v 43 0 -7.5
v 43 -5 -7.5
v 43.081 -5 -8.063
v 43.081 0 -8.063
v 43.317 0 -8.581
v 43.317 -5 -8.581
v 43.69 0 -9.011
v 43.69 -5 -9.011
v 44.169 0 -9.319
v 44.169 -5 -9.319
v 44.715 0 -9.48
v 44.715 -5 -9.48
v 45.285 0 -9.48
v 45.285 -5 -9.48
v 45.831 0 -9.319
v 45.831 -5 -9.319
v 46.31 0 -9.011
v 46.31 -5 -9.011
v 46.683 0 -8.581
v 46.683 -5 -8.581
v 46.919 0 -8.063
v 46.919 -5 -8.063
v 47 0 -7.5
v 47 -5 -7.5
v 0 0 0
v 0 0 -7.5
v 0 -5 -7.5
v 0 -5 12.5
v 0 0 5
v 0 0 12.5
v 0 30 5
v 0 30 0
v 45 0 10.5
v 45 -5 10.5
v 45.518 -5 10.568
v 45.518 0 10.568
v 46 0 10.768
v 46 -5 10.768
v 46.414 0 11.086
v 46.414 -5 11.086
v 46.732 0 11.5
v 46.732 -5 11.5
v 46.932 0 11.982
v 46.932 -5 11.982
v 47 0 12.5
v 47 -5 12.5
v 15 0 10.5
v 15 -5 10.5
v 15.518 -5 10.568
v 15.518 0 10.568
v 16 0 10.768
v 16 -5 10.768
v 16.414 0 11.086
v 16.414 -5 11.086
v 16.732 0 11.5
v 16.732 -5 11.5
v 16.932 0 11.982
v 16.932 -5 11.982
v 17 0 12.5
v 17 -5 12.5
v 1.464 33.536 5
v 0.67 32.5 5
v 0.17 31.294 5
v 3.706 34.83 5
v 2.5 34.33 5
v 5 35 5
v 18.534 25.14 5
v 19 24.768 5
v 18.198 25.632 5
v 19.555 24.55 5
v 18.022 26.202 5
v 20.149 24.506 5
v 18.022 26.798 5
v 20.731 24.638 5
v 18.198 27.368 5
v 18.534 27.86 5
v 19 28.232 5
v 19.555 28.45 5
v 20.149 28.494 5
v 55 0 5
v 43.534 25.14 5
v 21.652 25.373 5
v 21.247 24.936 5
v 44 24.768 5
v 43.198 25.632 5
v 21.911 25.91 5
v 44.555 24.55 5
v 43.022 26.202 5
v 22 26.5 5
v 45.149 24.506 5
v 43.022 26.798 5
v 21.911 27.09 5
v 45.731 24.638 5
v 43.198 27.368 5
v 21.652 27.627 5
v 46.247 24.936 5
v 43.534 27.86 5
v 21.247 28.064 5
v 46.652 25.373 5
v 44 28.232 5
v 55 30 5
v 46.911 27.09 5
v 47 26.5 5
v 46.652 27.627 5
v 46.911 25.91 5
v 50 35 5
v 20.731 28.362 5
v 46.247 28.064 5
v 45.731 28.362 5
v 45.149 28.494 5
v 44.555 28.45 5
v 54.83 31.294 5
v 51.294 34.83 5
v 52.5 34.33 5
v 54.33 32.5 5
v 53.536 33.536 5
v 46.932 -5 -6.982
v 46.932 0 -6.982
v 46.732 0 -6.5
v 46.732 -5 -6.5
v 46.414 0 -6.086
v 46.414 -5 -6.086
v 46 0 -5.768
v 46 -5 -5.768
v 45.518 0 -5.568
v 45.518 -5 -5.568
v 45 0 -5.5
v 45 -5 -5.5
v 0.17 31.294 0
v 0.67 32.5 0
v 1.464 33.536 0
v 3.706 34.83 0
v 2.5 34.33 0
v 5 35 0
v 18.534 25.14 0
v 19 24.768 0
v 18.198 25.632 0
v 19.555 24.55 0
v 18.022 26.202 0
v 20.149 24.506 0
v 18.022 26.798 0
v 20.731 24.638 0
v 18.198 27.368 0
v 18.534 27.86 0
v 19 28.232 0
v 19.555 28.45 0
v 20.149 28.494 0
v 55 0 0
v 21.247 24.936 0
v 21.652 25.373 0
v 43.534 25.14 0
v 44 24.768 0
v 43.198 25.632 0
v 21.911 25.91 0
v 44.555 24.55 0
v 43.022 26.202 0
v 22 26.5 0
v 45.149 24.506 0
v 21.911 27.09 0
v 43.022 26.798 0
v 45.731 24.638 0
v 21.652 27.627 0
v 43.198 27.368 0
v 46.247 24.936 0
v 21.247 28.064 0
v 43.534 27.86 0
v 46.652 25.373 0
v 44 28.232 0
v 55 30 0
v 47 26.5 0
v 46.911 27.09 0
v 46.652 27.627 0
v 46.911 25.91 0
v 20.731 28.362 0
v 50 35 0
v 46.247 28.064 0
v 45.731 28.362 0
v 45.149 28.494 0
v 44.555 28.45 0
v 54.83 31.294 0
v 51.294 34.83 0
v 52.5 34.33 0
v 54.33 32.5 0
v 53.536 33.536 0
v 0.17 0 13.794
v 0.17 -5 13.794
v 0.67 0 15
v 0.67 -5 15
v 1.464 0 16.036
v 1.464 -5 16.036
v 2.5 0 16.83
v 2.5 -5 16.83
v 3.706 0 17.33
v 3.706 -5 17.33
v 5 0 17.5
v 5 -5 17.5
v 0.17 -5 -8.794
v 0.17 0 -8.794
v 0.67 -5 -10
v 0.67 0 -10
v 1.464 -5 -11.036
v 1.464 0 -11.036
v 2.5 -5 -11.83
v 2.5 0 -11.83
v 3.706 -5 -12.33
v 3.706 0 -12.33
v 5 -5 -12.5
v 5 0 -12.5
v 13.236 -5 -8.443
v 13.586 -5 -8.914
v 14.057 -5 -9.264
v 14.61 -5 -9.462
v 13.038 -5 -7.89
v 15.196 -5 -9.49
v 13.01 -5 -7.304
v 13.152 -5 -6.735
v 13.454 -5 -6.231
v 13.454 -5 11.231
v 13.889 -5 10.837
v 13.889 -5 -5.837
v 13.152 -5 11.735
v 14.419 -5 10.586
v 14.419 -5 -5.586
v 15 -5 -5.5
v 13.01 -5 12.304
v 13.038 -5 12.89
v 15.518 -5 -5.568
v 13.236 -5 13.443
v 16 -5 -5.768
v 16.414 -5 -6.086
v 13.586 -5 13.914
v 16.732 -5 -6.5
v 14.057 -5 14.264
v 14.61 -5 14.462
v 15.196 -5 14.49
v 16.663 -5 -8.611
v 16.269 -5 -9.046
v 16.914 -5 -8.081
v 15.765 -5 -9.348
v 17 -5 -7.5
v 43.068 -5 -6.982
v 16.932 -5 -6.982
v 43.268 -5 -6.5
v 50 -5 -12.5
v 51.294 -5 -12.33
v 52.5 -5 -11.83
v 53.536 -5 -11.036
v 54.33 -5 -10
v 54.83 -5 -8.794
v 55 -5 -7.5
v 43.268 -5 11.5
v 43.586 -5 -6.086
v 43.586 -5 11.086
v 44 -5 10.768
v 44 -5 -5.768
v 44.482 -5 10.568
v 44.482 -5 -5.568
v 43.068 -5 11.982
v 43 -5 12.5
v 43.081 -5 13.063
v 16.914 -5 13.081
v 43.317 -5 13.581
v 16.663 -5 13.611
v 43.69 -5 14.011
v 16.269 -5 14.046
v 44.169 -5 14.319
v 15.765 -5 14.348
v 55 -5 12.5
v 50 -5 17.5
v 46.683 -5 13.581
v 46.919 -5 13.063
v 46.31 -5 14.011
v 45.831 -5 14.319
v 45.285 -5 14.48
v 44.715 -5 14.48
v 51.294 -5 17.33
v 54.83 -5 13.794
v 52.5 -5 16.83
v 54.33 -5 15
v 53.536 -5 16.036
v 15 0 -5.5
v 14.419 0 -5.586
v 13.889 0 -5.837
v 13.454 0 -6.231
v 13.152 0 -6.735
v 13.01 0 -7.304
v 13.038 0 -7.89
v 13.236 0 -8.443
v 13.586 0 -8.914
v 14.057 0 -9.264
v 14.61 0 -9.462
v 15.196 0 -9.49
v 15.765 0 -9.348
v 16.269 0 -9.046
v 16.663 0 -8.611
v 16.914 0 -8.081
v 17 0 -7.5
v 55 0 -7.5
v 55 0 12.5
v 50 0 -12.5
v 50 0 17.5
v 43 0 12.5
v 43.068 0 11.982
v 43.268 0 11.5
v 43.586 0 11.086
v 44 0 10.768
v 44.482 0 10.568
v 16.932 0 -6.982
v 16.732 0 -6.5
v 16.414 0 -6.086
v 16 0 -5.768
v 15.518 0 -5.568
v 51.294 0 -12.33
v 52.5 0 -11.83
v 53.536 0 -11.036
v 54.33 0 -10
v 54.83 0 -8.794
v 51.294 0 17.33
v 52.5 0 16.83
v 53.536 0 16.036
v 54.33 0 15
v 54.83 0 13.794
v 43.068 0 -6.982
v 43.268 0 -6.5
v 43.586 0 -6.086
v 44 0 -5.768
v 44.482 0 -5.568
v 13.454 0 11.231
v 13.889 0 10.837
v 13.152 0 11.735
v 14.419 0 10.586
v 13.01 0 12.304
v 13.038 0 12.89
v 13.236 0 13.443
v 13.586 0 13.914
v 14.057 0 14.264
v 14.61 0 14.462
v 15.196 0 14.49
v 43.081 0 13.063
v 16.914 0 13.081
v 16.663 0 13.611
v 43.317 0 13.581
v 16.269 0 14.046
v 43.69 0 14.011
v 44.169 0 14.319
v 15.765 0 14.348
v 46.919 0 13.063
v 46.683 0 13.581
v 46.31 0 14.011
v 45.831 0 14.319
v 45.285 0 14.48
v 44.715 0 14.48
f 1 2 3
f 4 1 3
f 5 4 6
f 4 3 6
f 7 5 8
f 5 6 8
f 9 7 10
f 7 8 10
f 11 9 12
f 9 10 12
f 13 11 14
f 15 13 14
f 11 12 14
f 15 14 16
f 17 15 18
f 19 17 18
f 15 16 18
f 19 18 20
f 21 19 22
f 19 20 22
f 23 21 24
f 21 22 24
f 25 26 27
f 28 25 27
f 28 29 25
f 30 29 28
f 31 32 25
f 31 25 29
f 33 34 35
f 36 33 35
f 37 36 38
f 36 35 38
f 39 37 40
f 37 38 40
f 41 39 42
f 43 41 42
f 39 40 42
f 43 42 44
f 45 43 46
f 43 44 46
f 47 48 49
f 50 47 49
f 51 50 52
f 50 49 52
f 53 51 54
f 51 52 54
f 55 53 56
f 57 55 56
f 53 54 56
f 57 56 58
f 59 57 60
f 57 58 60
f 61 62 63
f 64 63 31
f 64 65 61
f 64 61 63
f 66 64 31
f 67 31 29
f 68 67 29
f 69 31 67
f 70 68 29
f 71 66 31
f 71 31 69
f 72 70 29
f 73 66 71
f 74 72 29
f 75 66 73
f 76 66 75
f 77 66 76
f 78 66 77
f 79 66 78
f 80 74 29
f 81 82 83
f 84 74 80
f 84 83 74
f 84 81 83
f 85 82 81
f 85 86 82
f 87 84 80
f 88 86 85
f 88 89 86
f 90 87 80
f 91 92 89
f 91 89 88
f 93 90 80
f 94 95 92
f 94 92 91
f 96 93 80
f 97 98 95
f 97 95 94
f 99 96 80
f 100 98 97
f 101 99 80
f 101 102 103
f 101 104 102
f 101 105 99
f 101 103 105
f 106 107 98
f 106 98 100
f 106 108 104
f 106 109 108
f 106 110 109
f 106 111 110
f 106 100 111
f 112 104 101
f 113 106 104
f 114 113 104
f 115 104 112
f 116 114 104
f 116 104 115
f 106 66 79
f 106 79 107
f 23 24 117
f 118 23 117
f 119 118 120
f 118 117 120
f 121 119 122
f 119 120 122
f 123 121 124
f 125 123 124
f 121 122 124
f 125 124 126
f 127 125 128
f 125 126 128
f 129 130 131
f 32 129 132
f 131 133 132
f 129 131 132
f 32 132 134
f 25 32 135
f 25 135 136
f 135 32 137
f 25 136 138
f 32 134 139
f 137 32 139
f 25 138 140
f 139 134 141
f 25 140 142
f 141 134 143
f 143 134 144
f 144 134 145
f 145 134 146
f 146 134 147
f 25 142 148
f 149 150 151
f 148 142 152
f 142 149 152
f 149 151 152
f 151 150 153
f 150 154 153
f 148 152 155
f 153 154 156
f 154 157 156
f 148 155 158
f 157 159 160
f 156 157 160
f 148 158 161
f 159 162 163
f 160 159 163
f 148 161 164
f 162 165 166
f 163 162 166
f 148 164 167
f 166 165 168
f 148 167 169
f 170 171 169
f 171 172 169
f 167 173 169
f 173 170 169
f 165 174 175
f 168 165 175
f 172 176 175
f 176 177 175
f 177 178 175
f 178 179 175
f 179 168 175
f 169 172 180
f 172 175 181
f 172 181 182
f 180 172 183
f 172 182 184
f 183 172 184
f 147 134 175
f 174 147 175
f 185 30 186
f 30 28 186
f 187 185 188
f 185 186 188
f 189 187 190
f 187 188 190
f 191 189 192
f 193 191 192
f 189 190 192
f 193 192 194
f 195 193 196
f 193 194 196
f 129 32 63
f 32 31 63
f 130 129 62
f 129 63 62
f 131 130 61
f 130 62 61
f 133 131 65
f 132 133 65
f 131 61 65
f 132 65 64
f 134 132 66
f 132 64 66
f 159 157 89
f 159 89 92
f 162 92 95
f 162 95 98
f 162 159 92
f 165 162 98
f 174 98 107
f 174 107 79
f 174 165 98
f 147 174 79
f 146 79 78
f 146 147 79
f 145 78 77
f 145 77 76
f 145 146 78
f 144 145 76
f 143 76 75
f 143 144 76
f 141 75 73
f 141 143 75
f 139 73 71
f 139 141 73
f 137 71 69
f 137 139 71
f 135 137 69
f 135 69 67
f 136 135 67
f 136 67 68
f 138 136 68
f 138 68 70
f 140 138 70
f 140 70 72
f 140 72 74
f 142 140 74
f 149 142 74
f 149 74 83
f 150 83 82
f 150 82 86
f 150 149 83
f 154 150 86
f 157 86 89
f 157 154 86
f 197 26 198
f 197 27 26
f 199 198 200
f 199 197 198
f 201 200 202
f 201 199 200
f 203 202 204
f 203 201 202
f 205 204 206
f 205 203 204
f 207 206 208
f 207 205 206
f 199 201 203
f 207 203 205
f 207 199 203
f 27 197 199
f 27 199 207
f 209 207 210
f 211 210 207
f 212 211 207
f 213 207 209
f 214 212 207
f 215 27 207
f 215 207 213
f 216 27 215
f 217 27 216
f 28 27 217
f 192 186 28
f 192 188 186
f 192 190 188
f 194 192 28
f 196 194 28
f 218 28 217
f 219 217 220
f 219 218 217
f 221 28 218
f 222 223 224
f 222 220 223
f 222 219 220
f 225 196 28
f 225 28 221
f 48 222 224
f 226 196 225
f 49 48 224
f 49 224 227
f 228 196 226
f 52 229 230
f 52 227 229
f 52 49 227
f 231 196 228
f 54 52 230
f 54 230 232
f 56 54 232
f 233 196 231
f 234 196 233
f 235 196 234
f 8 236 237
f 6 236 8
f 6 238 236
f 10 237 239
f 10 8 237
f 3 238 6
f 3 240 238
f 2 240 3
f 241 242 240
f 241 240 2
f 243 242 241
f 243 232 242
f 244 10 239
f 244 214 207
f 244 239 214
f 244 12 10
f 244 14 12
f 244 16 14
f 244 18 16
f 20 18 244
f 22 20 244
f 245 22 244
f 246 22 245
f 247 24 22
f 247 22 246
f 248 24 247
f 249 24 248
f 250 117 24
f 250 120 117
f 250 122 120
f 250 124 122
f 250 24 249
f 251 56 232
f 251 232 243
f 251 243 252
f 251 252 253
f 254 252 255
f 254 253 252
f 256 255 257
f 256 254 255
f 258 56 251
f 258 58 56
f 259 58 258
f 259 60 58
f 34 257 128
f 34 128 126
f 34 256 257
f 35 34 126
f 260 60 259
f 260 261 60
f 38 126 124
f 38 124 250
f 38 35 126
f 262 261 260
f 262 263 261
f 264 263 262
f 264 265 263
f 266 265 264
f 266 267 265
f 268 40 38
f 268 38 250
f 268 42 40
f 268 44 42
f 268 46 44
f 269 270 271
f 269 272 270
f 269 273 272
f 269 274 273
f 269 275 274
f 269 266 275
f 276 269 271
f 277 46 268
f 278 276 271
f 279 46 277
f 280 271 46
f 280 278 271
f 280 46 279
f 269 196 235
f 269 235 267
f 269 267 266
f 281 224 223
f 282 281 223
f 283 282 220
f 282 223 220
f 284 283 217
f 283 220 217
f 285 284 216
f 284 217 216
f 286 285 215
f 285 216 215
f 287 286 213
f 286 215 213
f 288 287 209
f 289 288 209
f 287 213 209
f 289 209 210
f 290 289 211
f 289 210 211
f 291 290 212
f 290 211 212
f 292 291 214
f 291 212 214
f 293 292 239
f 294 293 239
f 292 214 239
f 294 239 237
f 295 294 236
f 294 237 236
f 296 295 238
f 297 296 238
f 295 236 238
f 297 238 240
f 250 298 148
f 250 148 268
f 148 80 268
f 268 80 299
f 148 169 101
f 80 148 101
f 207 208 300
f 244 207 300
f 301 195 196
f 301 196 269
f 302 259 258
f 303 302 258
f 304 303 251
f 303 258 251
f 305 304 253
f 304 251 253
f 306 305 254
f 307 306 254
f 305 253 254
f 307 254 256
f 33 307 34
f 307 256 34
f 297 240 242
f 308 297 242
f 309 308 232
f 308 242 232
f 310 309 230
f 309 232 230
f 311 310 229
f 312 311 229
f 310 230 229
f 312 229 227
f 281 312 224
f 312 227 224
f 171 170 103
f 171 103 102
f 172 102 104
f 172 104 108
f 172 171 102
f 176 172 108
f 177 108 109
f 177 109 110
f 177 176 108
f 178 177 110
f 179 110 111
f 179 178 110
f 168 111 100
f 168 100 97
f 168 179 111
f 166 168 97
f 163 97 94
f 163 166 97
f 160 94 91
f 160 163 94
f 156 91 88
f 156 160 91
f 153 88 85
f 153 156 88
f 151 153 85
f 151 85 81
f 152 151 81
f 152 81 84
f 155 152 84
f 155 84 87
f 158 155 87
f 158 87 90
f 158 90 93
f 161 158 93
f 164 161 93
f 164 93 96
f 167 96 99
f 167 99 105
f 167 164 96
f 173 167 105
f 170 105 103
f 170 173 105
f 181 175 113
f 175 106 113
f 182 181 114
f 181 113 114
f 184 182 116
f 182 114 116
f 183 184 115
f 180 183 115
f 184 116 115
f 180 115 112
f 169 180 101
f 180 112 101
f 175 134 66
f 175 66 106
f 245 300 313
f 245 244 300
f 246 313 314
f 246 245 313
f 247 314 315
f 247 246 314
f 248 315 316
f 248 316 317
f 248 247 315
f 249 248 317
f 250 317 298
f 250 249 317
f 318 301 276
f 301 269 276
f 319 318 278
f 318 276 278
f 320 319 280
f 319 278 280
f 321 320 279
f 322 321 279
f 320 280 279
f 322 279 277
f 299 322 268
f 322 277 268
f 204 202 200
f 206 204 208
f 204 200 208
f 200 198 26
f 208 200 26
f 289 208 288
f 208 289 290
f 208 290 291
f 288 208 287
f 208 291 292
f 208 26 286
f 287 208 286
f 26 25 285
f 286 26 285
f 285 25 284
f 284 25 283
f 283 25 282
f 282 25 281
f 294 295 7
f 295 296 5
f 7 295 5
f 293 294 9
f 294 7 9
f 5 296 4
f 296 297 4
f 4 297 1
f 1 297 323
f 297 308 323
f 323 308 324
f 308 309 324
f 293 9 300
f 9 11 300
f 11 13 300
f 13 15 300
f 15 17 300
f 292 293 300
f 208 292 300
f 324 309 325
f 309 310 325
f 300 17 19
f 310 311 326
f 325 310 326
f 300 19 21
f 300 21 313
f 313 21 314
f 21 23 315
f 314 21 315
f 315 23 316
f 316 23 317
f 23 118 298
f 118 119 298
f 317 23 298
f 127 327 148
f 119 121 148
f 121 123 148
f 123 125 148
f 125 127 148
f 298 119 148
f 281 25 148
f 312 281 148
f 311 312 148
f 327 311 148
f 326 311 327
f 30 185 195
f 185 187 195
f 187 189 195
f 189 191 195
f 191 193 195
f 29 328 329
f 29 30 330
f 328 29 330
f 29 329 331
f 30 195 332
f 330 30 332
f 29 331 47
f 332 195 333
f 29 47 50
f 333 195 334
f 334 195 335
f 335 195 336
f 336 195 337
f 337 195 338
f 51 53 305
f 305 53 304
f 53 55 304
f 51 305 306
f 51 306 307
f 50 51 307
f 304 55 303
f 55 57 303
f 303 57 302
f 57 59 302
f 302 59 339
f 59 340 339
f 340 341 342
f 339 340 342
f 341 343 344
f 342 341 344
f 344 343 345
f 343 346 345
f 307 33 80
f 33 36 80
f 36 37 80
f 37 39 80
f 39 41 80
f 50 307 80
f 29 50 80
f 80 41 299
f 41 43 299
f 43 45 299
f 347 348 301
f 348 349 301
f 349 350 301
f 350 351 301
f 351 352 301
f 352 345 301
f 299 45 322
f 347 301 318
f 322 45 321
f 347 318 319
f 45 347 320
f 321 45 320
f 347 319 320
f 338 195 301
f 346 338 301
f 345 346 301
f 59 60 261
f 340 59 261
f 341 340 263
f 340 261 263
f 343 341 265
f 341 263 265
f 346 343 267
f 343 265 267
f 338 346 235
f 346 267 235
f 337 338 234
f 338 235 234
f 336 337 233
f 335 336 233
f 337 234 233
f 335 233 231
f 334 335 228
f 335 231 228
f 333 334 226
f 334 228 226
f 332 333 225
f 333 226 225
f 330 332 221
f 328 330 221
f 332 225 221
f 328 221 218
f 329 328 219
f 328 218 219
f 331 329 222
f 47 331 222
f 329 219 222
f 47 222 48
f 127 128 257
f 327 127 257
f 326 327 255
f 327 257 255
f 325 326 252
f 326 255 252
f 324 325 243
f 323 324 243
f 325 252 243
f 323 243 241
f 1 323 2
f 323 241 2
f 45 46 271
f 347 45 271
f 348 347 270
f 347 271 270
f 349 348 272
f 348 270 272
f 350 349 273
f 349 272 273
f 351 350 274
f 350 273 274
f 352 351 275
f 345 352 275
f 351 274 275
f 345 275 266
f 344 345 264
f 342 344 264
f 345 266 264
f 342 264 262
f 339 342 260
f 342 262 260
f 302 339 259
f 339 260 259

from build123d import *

# Parameters (mm, degrees)
SKETCH1_W           = 55
SKETCH1_H           = 35
SKETCH1_R           = 2
BOSS_EXTRUDE1_DEPTH = 5
SKETCH2_W           = 55
SKETCH2_H           = 30
BOSS_EXTRUDE2_DEPTH = 5
CUT_EXTRUDE1_DEPTH  = 5
FILLET1_R           = 5


with BuildPart() as part:
    # Sketch1 → Boss-Extrude1 (new body)
    with BuildSketch(Plane.XY):
        with Locations((27.5, 17.5)):
            Rectangle(SKETCH1_W, SKETCH1_H)
        with Locations((20, 26.5)):
            Circle(SKETCH1_R, mode=Mode.SUBTRACT)
        with Locations((45, 26.5)):
            Circle(SKETCH1_R, mode=Mode.SUBTRACT)
    extrude(amount=BOSS_EXTRUDE1_DEPTH)

    # Sketch2 → Boss-Extrude2 (add)
    with BuildSketch(Plane.XZ):
        with Locations((27.5, 2.5)):
            Rectangle(SKETCH2_W, SKETCH2_H)
    extrude(amount=BOSS_EXTRUDE2_DEPTH)

    # Sketch5 → Cut-Extrude1 (cut)
    with BuildSketch(Plane.XZ.offset(5)):
        with BuildLine():
            ThreePointArc((17, 12.5), (13.585786438, 13.914213562), (15, 10.5))
            Line((15, 10.5), (15, 12.5))
            Line((15, 12.5), (17, 12.5))
        make_face()
        with BuildLine():
            Line((15, 12.5), (15, 10.5))
            ThreePointArc((15, 10.5), (16.414213562, 11.085786438), (17, 12.5))
            Line((17, 12.5), (15, 12.5))
        make_face()
        with BuildLine():
            ThreePointArc((43, 12.5), (43.585786438, 11.085786438), (45, 10.5))
            Line((45, 10.5), (45, 12.5))
            Line((45, 12.5), (43, 12.5))
        make_face()
        with BuildLine():
            Line((45, 12.5), (45, 10.5))
            ThreePointArc((45, 10.5), (46.414213562, 11.085786438), (47, 12.5))
            ThreePointArc((47, 12.5), (45, 14.5), (43, 12.5))
            Line((43, 12.5), (45, 12.5))
        make_face()
        with BuildLine():
            ThreePointArc((45, -5.5), (43.585786438, -6.085786438), (43, -7.5))
            Line((43, -7.5), (45, -7.5))
            Line((45, -7.5), (45, -5.5))
        make_face()
        with BuildLine():
            Line((45, -7.5), (43, -7.5))
            ThreePointArc((43, -7.5), (45, -9.5), (47, -7.5))
            ThreePointArc((47, -7.5), (46.414213562, -6.085786438), (45, -5.5))
            Line((45, -5.5), (45, -7.5))
        make_face()
        with BuildLine():
            Line((15, -5.5), (15, -7.5))
            Line((15, -7.5), (17, -7.5))
            ThreePointArc((17, -7.5), (16.414213562, -6.085786438), (15, -5.5))
        make_face()
        with BuildLine():
            Line((17, -7.5), (15, -7.5))
            Line((15, -7.5), (15, -5.5))
            ThreePointArc((15, -5.5), (13.585786438, -8.914213562), (17, -7.5))
        make_face()
    extrude(amount=-CUT_EXTRUDE1_DEPTH, mode=Mode.SUBTRACT)

    # Fillet1
    fillet1_edges = [part.edges().sort_by_distance(p)[0] for p in [
        (0, -2.5, 17.5),
        (0, -2.5, -12.5),
        (55, -2.5, -12.5),
        (55, -2.5, 17.5),
        (0, 35, 2.5),
        (55, 35, 2.5),
    ]]
    fillet(fillet1_edges, radius=FILLET1_R)


solid = part.part
